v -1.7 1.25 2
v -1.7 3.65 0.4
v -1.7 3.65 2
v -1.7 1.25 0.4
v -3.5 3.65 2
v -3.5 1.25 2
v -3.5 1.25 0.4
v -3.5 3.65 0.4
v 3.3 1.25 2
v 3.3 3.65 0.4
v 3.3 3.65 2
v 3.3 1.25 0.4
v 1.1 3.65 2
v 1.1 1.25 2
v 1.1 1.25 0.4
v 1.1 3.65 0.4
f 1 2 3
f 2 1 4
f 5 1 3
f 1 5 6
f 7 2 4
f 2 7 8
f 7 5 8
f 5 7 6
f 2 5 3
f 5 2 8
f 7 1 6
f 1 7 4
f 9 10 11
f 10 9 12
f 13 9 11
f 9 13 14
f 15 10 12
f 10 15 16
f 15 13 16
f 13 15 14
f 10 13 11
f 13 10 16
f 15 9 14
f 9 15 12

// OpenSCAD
union() {
  translate([-3.5, 1.25, 0.4]) cube(size=[1.8,2.4,1.6], center=false);
  translate([1.1, 1.25, 0.4]) cube(size=[2.2,2.4,1.6], center=false);
}
